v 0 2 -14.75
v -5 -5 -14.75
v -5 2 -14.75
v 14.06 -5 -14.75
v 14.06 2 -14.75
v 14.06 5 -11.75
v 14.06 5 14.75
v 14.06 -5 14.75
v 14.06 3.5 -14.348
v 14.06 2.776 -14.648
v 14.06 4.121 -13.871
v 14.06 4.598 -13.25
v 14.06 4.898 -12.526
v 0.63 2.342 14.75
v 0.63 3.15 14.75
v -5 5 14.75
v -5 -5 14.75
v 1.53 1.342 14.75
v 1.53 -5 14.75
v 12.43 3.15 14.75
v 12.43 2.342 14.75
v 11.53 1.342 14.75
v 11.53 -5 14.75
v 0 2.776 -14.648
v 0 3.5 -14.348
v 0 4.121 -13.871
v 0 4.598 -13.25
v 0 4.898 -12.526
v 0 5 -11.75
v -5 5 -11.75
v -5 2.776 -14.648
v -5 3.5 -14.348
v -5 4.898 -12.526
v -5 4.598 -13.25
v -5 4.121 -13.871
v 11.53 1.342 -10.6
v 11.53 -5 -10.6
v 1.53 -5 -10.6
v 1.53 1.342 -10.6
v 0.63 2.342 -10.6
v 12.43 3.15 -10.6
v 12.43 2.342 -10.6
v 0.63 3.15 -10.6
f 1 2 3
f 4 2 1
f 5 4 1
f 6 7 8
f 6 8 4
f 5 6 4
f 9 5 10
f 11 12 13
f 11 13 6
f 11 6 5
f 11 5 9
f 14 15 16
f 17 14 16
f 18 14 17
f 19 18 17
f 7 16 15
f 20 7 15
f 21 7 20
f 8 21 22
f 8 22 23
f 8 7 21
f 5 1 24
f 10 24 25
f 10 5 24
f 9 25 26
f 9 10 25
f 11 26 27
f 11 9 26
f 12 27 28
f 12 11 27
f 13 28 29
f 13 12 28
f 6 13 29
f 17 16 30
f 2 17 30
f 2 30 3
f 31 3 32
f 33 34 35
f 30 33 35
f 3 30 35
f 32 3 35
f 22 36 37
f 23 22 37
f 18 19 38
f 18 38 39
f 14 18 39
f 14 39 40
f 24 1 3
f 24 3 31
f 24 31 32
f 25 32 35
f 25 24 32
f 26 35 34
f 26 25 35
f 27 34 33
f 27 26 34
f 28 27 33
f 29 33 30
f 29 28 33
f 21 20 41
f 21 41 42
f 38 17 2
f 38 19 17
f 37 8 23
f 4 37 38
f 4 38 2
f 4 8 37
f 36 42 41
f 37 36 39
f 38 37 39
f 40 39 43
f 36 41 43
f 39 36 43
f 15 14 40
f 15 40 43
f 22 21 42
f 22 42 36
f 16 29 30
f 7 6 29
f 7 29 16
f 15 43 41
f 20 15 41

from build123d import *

# Parameters (mm, degrees)
SKETCH_1_W          = 29.5
SKETCH_1_H          = 10
EXTRUDE_1_DEPTH     = 13.06
FILLET_1_R          = 3
CUT_EXTRUDE_1_DEPTH = 25.35
EXTRUDE_START       = 1
EXTRUDE_2_DEPTH     = 1
EXTRUDE_START_2     = -13.06
EXTRUDE_3_DEPTH     = 5


with BuildPart() as part:
    # 草图1 → 凸台-拉伸1 (new body)
    with BuildSketch(Plane(origin=(0, 0, 0), x_dir=(0, 0, -1), z_dir=(1, 0, 0))):
        Rectangle(SKETCH_1_W, SKETCH_1_H)
    extrude(amount=EXTRUDE_1_DEPTH)

    # 圆角1
    fillet_1_edges = [part.edges().sort_by_distance(p)[0] for p in [
        (6.53, 5, -14.75),
    ]]
    fillet(fillet_1_edges, radius=FILLET_1_R)

    # 草图3 → 切除-拉伸1 (cut)
    with BuildSketch(Plane.XY.offset(14.75)):
        Polygon((11.53, -7.004935671), (1.53, -7.004935671), (1.53, 1.342439599), (0.63, 2.342439599), (0.63, 3.15), (12.43, 3.15), (12.43, 2.342439599), (11.53, 1.342439599), align=None)
    extrude(amount=-CUT_EXTRUDE_1_DEPTH, mode=Mode.SUBTRACT)

    # 草图4 → 凸台-拉伸2 (add)
    with BuildSketch(Plane(origin=(13.06, 0, 0), x_dir=(0, 0, -1), z_dir=(1, 0, 0)).offset(EXTRUDE_START)):
        with BuildLine():
            Line((14.75, -5), (14.75, 2))
            ThreePointArc((14.75, 2), (13.871320344, 4.121320344), (11.75, 5))
            Line((11.75, 5), (-14.75, 5))
            Line((-14.75, 5), (-14.75, -5))
            Line((-14.75, -5), (14.75, -5))
        make_face()
    extrude(amount=-EXTRUDE_2_DEPTH)

    # 草图4<3> → 凸台-拉伸3 (add)
    with BuildSketch(Plane(origin=(13.06, 0, 0), x_dir=(0, 0, -1), z_dir=(1, 0, 0)).offset(EXTRUDE_START_2)):
        with BuildLine():
            Line((14.75, -5), (14.75, 2))
            ThreePointArc((14.75, 2), (13.871320344, 4.121320344), (11.75, 5))
            Line((11.75, 5), (-14.75, 5))
            Line((-14.75, 5), (-14.75, -5))
            Line((-14.75, -5), (14.75, -5))
        make_face()
    extrude(amount=-EXTRUDE_3_DEPTH)


solid = part.part
